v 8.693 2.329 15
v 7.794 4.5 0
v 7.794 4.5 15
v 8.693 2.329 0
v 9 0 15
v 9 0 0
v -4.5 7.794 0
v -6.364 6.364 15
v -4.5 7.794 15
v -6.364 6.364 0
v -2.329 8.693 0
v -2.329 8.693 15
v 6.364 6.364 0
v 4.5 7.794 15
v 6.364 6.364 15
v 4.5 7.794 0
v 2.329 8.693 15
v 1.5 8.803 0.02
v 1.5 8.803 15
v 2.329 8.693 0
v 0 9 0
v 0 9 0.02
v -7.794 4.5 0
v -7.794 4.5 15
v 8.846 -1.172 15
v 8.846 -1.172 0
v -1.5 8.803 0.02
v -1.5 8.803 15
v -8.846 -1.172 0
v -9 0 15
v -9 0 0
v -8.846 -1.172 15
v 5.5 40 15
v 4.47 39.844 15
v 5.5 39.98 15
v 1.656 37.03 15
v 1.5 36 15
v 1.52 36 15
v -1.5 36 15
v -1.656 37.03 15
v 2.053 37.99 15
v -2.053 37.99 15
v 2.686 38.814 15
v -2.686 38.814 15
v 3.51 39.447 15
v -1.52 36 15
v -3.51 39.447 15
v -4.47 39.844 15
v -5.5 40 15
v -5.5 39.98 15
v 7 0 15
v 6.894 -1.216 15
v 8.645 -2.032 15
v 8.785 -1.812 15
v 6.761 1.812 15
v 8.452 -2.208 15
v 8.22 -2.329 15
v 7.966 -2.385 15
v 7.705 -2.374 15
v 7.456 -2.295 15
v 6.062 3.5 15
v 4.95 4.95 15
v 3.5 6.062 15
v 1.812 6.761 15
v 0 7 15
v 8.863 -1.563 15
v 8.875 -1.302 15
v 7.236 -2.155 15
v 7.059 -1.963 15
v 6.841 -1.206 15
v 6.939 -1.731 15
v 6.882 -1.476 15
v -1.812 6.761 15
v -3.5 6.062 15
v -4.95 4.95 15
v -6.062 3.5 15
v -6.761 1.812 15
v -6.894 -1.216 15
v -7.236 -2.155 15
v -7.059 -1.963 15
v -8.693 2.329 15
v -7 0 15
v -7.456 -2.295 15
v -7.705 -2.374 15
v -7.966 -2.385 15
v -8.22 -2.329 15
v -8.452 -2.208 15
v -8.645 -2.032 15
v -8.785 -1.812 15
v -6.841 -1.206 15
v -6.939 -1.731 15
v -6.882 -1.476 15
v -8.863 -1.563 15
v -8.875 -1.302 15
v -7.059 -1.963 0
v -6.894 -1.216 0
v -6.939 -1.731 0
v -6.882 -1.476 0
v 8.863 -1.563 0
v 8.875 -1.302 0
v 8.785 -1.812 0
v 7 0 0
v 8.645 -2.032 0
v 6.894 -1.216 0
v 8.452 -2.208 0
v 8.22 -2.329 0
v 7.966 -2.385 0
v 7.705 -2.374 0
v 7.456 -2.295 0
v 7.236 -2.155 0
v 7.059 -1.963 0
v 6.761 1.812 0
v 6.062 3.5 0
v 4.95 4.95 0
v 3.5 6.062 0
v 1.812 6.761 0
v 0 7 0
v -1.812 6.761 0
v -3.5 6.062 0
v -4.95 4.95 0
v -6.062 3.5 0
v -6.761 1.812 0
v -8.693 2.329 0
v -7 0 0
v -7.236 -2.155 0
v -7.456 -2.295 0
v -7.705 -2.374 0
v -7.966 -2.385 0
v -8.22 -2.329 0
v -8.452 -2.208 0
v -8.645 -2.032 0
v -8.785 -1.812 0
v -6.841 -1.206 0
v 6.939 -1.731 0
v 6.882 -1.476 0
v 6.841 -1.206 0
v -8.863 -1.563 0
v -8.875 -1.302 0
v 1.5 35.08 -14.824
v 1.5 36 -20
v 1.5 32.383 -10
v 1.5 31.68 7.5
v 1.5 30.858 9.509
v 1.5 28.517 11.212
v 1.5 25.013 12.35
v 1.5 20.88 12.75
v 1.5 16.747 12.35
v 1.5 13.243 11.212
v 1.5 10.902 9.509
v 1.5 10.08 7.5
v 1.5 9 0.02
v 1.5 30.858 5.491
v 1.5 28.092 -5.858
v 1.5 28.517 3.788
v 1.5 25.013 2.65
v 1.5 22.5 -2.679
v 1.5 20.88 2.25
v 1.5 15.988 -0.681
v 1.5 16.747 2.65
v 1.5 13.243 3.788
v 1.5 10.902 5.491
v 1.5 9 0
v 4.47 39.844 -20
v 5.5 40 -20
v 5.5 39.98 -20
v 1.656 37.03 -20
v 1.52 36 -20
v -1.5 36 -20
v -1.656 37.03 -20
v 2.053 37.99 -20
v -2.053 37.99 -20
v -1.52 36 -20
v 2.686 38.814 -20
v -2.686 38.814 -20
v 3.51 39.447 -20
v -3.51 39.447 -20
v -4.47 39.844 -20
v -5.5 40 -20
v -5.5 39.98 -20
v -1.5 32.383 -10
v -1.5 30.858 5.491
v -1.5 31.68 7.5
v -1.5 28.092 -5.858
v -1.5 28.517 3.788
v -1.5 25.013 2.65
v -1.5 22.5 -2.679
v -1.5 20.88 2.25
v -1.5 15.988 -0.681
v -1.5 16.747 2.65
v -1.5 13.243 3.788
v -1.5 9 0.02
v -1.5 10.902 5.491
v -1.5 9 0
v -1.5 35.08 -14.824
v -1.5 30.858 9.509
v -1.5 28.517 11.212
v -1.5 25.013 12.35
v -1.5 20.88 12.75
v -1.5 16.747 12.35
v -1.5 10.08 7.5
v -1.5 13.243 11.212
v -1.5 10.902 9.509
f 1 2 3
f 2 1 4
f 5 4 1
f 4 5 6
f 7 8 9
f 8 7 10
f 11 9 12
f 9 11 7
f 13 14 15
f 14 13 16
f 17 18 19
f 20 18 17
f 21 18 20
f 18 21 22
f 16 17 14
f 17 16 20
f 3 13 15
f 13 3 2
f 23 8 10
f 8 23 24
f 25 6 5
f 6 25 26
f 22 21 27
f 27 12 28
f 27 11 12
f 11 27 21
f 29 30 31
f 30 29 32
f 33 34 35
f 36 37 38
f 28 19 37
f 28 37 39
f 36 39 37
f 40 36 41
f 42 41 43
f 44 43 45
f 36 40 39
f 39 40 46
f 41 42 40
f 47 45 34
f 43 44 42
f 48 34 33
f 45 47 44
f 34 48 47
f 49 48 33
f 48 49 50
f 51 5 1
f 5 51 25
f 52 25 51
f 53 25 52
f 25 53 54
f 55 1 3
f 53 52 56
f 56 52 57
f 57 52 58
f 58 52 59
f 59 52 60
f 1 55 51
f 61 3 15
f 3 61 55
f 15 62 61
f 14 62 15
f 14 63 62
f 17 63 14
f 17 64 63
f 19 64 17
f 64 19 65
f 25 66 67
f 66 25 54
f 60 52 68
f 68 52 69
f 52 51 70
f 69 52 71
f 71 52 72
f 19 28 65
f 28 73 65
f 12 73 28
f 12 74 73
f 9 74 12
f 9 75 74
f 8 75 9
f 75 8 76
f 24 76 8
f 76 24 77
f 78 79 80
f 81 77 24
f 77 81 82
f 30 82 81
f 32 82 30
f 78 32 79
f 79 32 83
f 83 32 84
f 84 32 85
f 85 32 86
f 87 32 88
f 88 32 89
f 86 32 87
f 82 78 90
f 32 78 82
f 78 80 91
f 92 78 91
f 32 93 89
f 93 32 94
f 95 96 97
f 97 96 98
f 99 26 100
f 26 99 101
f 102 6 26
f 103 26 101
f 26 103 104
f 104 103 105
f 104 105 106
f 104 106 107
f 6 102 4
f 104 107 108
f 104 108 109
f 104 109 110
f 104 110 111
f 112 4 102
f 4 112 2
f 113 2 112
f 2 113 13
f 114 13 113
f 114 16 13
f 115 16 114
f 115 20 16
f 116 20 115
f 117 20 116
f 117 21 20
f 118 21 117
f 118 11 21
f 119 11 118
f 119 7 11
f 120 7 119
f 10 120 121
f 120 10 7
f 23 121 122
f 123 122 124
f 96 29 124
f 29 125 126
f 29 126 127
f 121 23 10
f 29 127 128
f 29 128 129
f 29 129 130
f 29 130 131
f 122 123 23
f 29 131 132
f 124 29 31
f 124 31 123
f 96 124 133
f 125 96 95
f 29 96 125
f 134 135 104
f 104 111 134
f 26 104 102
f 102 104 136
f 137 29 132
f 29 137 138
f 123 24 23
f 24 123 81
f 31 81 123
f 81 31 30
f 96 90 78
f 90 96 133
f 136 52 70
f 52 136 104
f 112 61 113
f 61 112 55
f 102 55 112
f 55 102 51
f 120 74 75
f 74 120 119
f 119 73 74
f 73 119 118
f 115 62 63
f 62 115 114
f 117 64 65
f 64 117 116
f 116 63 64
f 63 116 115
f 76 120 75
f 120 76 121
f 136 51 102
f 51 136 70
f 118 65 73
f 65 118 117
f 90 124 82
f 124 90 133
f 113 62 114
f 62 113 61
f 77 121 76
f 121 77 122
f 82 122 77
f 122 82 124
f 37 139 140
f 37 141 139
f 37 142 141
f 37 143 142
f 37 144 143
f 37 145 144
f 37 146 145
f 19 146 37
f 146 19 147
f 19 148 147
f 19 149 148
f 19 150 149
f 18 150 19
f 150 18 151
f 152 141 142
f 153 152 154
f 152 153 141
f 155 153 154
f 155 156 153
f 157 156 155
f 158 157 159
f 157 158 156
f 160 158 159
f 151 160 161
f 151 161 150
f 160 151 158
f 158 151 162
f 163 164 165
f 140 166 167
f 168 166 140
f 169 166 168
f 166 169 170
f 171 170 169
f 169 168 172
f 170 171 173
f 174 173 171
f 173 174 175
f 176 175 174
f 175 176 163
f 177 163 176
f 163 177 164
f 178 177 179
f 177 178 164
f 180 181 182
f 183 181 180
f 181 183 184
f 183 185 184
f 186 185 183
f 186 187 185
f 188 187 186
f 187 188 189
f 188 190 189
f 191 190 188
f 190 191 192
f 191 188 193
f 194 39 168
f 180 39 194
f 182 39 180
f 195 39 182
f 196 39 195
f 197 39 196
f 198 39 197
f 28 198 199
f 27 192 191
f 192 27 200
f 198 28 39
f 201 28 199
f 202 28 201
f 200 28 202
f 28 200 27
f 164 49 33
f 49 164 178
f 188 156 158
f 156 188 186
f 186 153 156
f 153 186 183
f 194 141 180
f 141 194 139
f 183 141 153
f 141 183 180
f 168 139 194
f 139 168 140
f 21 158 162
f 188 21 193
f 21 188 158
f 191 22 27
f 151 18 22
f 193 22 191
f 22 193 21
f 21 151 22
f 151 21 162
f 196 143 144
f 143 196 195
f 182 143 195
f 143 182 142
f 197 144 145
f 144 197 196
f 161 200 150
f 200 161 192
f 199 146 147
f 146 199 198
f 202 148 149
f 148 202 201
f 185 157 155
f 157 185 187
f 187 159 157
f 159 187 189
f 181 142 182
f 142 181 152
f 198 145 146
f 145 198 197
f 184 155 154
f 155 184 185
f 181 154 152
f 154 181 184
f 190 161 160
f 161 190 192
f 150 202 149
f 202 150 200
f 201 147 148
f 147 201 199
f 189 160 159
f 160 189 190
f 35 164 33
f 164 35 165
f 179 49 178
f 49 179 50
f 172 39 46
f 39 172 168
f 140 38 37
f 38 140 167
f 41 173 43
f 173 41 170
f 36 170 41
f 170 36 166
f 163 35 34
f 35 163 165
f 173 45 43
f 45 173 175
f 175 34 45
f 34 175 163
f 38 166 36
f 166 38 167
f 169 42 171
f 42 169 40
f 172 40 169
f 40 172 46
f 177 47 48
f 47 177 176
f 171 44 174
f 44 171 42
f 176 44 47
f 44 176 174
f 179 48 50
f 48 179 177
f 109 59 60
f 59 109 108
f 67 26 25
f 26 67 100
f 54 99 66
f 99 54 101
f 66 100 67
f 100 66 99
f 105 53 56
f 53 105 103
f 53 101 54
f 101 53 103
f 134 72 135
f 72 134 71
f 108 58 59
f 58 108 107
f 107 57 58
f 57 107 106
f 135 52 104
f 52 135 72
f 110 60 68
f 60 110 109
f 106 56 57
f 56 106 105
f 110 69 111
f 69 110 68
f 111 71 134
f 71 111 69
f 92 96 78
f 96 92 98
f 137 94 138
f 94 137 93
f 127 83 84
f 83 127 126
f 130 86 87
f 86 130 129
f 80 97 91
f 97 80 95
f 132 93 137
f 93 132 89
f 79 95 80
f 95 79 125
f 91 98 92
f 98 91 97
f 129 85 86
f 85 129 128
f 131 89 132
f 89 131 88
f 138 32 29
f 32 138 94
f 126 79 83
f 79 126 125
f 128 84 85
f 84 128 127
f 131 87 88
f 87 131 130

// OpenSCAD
$fa=15;
$fs=0.2;

//wall distance to pipe (axial)
wd=40;
//pipe diameter
pd=14;
//clip thickness
ct=2;
//clip heigth
ch=15;
//clip apperture
ca=160;
//strut thickness
st=3;
//strut heigh
sh=20;
//strut min size
sms=4;
//should a hole be drilled through the strut (1) or not (0). value > 1 will result in havoc, 
//but floats in the 0-1 range will yeld fonctional results.
//for small clip heigth (<10) , it may be better to lower this a bit (for robustness). 
hole_in_strut=1;

w1=4*(pd/2+ct);

//wall
//translate([-100,wd,-100]) cube([200,2,200]);


	//--------- clip tuyau -------------------------------------------------------
	difference() {
		cylinder(h=ch,d=pd+ct*2);
		translate([0,0,-1]) linear_extrude(height = ch+2)	
			polygon(points=[[0,0],[-w1*cos(90+ca/2),-w1*sin(90+ca/2)],[w1,-w1],[-w1,-w1],[-w1*cos(90-ca/2),-w1*sin(90-ca/2)]]);
		translate([0,0,-100]) cylinder(h=200,d=pd);	
		}
	//cylindres au bout du clip
	rotate([0,0,-(180-ca)/2]) translate([(pd+ct)/2,0,0]) cylinder(h=ch,d=ct);
	rotate([0,0,180+(180-ca)/2]) translate([(pd+ct)/2,0,0]) cylinder(h=ch,d=ct);
	//--------- etai  -------------------------------------------------------
	//central strut
	difference() {
		translate([-st/2,pd/1.99,-sh])cube([st,wd-pd/1.99,sh+ch]);
		translate([0,pd/2+ct,-sh]) scale([st*5,wd-pd/2-sms-ct,sh])  rotate([0,90,0])cylinder(r=1,h=st*2,center=true);
		translate([(pd+ct)/-2,0,-sh+0.02]) cube([pd+ct,pd/2+ct,sh]);
		//hole through the strut
		translate([-st,pd/2+ct+(wd-sms-ct-pd/2)*0.44,ch/2]) rotate([90,0,90]) scale([(wd-sms-ct-pd/2)*0.8,ch*0.7,1])cylinder(d=hole_in_strut,h=st*2);
		}
	
	difference() {
	translate([-st/2-sms,wd-sms,-sh])cube([st+sms*2,sms,sh+ch]);
	translate([st/2+sms,wd-sms,-sh-1]) cylinder(h=sh+ch+2,d=sms*1.99);
	translate([st/-2-sms,wd-sms,-sh-1]) cylinder(h=sh+ch+2,d=sms*1.99);
	}
	
	
